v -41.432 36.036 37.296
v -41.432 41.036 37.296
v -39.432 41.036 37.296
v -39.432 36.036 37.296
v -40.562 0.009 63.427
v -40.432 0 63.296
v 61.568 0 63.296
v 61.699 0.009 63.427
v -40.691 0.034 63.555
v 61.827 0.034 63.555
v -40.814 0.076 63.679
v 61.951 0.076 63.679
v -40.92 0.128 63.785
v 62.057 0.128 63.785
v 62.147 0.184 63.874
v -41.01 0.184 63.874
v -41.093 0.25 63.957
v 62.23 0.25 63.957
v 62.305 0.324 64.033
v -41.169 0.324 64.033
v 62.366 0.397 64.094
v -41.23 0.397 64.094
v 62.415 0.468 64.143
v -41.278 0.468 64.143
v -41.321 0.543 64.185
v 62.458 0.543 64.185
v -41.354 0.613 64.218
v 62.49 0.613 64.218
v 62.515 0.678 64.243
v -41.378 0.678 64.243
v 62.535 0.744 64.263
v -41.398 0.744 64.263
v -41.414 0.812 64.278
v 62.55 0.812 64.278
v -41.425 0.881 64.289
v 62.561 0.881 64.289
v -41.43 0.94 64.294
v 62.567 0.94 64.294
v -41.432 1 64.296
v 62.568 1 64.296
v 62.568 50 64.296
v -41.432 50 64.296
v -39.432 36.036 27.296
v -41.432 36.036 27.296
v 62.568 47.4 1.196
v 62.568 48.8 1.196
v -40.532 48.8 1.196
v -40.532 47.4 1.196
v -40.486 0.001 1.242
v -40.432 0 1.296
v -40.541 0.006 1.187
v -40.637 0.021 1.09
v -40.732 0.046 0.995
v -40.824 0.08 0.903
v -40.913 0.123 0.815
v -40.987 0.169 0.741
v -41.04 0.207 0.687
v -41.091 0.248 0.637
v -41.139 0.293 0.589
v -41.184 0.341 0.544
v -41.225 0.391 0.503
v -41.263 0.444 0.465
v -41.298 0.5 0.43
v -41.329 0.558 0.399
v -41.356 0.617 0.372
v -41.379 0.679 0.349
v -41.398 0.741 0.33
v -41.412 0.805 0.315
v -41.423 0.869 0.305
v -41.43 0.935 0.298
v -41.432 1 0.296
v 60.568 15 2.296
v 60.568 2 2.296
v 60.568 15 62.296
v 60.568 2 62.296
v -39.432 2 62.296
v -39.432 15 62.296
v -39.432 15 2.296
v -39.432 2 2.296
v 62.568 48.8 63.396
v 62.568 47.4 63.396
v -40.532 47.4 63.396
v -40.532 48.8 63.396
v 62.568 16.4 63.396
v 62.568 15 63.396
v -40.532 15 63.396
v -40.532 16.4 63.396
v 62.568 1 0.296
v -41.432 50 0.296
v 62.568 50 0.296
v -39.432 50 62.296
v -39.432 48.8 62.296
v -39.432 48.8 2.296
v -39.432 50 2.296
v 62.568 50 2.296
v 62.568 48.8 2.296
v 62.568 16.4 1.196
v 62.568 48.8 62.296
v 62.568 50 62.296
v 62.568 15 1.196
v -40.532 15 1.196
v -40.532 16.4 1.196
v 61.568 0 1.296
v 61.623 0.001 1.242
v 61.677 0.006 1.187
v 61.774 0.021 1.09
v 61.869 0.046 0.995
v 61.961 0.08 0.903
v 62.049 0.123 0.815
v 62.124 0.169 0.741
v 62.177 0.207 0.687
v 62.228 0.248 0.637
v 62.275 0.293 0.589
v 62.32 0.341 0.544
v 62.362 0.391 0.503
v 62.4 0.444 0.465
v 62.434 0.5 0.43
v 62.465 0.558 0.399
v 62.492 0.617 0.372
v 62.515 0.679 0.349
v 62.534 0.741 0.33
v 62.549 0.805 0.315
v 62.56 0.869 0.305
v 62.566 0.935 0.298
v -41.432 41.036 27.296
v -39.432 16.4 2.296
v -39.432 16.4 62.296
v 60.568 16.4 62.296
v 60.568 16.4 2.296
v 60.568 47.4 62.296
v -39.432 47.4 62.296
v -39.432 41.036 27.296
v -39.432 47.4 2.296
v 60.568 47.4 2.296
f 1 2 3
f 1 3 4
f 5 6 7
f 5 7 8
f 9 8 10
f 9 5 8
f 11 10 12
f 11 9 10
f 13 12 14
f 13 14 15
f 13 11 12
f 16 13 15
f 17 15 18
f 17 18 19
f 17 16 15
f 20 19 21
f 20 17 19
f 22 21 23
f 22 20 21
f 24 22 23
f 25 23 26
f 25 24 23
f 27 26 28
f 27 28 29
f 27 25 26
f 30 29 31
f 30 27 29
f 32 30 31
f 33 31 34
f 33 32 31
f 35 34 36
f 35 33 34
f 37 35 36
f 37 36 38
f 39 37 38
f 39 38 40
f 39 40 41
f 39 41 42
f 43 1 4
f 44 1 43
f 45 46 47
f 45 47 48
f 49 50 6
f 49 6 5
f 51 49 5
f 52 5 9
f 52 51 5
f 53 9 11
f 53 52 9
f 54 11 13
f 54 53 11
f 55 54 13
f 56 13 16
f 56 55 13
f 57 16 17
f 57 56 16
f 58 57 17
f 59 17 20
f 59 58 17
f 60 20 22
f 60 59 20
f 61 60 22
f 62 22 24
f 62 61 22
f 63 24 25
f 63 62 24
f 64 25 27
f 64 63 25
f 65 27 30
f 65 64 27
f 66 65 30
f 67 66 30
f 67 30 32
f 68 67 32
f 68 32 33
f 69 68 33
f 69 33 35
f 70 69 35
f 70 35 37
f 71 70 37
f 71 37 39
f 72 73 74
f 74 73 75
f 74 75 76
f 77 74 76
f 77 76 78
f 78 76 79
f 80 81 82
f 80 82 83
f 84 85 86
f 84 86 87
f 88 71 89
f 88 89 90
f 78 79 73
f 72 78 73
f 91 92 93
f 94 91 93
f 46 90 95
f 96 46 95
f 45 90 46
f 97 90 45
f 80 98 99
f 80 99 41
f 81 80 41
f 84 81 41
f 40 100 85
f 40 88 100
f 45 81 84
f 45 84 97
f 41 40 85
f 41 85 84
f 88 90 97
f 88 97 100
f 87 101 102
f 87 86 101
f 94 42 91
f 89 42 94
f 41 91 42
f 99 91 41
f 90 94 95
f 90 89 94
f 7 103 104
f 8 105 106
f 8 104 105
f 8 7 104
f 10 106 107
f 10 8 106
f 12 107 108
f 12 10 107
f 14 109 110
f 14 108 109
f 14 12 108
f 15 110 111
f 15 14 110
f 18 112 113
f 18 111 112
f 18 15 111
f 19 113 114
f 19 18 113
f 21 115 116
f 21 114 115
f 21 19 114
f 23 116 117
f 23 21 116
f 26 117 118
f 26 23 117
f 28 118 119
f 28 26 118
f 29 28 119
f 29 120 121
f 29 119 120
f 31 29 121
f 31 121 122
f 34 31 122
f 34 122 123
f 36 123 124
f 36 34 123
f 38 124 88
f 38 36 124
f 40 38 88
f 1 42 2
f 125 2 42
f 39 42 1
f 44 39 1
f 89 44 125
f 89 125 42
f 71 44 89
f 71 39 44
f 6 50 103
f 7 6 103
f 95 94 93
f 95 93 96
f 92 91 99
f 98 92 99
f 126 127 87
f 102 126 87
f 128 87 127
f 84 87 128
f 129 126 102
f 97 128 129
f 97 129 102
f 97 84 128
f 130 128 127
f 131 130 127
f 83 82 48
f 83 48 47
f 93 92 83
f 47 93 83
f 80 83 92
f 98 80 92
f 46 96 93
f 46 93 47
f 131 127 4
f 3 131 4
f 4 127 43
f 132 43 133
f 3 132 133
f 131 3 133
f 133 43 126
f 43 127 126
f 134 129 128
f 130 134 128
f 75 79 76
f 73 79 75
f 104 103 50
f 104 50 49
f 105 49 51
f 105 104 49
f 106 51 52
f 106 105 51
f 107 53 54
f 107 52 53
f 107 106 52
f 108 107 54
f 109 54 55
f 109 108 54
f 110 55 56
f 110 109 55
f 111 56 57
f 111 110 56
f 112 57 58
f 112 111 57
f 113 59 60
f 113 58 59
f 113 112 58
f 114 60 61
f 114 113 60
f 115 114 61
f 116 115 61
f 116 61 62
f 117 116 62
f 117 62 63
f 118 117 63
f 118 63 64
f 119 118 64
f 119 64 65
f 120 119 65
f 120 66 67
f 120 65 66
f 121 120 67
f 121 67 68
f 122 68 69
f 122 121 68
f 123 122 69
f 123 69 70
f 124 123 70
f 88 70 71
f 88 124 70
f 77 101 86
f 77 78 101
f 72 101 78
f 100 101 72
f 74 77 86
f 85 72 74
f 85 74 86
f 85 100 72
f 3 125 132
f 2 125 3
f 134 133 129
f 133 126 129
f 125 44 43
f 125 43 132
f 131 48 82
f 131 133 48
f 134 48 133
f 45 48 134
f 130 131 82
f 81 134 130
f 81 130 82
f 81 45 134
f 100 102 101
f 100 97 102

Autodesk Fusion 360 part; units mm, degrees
sketch "Esquisse1" plane through (0, 0, 0) normal (0, 1, 0) x (1, 0, 0)
  line L0 (-41.4317, -0.2961) -> (62.5683, -0.2961)
  line L1 (62.5683, -0.2961) -> (62.5683, -64.2961)
  line L2 (62.5683, -64.2961) -> (-41.4317, -64.2961)
  line L3 (-41.4317, -64.2961) -> (-41.4317, -0.2961)
  dimension "d1" = 104
  dimension "d2" = 64
extrude "Extrusion1" add sketch "Esquisse1" along normal blind 50
shell "Coque1" thickness 2 removed faces 1 at (-6.765, 50, 21.6294)
sketch "Sketch4" plane through (62.5683, 0, 0) normal (1, 0, 0) x (0, 1, 0)
  line L0 (0, 64.2961) -> (0, 0.2961)
  line L1 (0, 0.2961) -> (50, 0.2961)
  line L2 (50, 0.2961) -> (50, 64.2961)
  line L3 (50, 64.2961) -> (0, 64.2961)
  line L4 (0, 32.2961) -> (50, 32.2961) construction
  line L5 (15, 63.3961) -> (16.4, 63.3961)
  line L6 (16.4, 63.3961) -> (16.4, 1.1961)
  line L7 (16.4, 1.1961) -> (15, 1.1961)
  line L8 (15, 1.1961) -> (15, 63.3961)
  line L9 (48.8, 1.1961) -> (47.4, 1.1961)
  line L10 (47.4, 1.1961) -> (47.4, 63.3961)
  line L11 (47.4, 63.3961) -> (48.8, 63.3961)
  line L12 (48.8, 63.3961) -> (48.8, 1.1961)
  line L13 (48.8, 62.2961) -> (50, 62.2961)
  line L14 (48.8, 2.2961) -> (50, 2.2961)
  dimension "d19" = 1.4
  dimension "d20" = 1.4
  dimension "d55" = 31
  dimension "d66" = 0.9
  dimension "d67" = 2
  dimension "d79" = 15
extrude "Extrude4" cut sketch "Sketch4" against normal blind 103.1 contours L9 L10 L11 L12 | L5 L6 L7 L8
sketch "Sketch8" plane through (0, 50, 0) normal (0, 1, 0) x (-1, 0, 0)
  line L0 (39.4317, 2.2961) -> (-60.5683, 2.2961)
  line L1 (-60.5683, 62.2961) -> (39.4317, 62.2961)
  line L2 (41.4317, 64.2961) -> (-62.5683, 64.2961)
  line L3 (-62.5683, 64.2961) -> (-62.5683, 0.2961)
  line L4 (-62.5683, 0.2961) -> (41.4317, 0.2961)
  line L5 (41.4317, 0.2961) -> (41.4317, 64.2961)
  line L6 (-60.5683, 2.2961) -> (-62.5683, 2.2961)
  line L7 (-62.5683, 2.2961) -> (-62.5683, 42.2961)
  line L8 (-60.5683, 42.2961) -> (-60.5683, 2.2961)
  line L9 (39.4317, 62.2961) -> (39.4317, 2.2961)
  line L10 (-60.5683, 2.2961) -> (-60.5683, 62.2961)
  line L11 (-60.5683, 62.2961) -> (-62.5683, 62.2961)
  line L12 (-60.5683, 42.2961) -> (-60.5683, 62.2961)
  line L13 (-62.5683, 42.2961) -> (-62.5683, 2.2961)
extrude "Extrude6" cut sketch "Sketch8" against normal blind 1.3 contours L3 L6 L7 L8 L10 L11 L12 L13
sketch "Sketch9" plane through (0, 0, 64.2961) normal (0, 0, 1) x (-1, 0, 0)
  line L0 (-62.5683, 0) -> (-62.5683, -50)
  line L1 (-62.5683, -50) -> (41.4317, -50)
  line L2 (41.4317, -50) -> (41.4317, 0)
  line L3 (-62.5683, -45.1) -> (41.4317, -45.1) construction
  line L4 (-18.0683, -43.6) -> (-3.0683, -43.6)
  line L5 (-3.0683, -43.6) -> (-3.0683, -46.6)
  line L6 (-3.0683, -46.6) -> (-18.0683, -46.6)
  line L7 (-18.0683, -46.6) -> (-18.0683, -43.6)
  line L8 (-10.5683, -50) -> (-10.5683, -31.2) construction
  line L9 (41.4317, 0) -> (-62.5683, 0)
  dimension "d61" = 4.9
  dimension "d62" = 15
  dimension "d63" = 3
fillet "Fillet1" radius 1 4 edges at (10.5683, 0, 64.2961) (62.5683, 0, 32.2961) (10.5683, 0, 0.2961) (-41.4317, 0, 32.2961)
sketch "Sketch12" plane through (-41.4317, 0, 0) normal (-1, 0, 0) x (0, -1, 0)
  line L0 (-1, 0.2961) -> (-1, 64.2961)
  line L1 (-1, 64.2961) -> (-50, 64.2961)
  line L2 (-50, 64.2961) -> (-50, 0.2961)
  line L3 (-50, 0.2961) -> (-1, 0.2961)
  line L4 (-41.0361, 37.2961) -> (-36.0361, 37.2961)
  line L5 (-36.0361, 37.2961) -> (-36.0361, 27.2961)
  line L6 (-36.0361, 27.2961) -> (-41.0361, 27.2961)
  line L7 (-41.0361, 27.2961) -> (-41.0361, 37.2961)
  line L8 (-1, 32.2961) -> (-50, 32.2961) construction
  dimension "d80" = 5
  dimension "d81" = 10
extrude "Extrude10" cut sketch "Sketch12" against normal blind 15 contours L4 L5 L6 L7
